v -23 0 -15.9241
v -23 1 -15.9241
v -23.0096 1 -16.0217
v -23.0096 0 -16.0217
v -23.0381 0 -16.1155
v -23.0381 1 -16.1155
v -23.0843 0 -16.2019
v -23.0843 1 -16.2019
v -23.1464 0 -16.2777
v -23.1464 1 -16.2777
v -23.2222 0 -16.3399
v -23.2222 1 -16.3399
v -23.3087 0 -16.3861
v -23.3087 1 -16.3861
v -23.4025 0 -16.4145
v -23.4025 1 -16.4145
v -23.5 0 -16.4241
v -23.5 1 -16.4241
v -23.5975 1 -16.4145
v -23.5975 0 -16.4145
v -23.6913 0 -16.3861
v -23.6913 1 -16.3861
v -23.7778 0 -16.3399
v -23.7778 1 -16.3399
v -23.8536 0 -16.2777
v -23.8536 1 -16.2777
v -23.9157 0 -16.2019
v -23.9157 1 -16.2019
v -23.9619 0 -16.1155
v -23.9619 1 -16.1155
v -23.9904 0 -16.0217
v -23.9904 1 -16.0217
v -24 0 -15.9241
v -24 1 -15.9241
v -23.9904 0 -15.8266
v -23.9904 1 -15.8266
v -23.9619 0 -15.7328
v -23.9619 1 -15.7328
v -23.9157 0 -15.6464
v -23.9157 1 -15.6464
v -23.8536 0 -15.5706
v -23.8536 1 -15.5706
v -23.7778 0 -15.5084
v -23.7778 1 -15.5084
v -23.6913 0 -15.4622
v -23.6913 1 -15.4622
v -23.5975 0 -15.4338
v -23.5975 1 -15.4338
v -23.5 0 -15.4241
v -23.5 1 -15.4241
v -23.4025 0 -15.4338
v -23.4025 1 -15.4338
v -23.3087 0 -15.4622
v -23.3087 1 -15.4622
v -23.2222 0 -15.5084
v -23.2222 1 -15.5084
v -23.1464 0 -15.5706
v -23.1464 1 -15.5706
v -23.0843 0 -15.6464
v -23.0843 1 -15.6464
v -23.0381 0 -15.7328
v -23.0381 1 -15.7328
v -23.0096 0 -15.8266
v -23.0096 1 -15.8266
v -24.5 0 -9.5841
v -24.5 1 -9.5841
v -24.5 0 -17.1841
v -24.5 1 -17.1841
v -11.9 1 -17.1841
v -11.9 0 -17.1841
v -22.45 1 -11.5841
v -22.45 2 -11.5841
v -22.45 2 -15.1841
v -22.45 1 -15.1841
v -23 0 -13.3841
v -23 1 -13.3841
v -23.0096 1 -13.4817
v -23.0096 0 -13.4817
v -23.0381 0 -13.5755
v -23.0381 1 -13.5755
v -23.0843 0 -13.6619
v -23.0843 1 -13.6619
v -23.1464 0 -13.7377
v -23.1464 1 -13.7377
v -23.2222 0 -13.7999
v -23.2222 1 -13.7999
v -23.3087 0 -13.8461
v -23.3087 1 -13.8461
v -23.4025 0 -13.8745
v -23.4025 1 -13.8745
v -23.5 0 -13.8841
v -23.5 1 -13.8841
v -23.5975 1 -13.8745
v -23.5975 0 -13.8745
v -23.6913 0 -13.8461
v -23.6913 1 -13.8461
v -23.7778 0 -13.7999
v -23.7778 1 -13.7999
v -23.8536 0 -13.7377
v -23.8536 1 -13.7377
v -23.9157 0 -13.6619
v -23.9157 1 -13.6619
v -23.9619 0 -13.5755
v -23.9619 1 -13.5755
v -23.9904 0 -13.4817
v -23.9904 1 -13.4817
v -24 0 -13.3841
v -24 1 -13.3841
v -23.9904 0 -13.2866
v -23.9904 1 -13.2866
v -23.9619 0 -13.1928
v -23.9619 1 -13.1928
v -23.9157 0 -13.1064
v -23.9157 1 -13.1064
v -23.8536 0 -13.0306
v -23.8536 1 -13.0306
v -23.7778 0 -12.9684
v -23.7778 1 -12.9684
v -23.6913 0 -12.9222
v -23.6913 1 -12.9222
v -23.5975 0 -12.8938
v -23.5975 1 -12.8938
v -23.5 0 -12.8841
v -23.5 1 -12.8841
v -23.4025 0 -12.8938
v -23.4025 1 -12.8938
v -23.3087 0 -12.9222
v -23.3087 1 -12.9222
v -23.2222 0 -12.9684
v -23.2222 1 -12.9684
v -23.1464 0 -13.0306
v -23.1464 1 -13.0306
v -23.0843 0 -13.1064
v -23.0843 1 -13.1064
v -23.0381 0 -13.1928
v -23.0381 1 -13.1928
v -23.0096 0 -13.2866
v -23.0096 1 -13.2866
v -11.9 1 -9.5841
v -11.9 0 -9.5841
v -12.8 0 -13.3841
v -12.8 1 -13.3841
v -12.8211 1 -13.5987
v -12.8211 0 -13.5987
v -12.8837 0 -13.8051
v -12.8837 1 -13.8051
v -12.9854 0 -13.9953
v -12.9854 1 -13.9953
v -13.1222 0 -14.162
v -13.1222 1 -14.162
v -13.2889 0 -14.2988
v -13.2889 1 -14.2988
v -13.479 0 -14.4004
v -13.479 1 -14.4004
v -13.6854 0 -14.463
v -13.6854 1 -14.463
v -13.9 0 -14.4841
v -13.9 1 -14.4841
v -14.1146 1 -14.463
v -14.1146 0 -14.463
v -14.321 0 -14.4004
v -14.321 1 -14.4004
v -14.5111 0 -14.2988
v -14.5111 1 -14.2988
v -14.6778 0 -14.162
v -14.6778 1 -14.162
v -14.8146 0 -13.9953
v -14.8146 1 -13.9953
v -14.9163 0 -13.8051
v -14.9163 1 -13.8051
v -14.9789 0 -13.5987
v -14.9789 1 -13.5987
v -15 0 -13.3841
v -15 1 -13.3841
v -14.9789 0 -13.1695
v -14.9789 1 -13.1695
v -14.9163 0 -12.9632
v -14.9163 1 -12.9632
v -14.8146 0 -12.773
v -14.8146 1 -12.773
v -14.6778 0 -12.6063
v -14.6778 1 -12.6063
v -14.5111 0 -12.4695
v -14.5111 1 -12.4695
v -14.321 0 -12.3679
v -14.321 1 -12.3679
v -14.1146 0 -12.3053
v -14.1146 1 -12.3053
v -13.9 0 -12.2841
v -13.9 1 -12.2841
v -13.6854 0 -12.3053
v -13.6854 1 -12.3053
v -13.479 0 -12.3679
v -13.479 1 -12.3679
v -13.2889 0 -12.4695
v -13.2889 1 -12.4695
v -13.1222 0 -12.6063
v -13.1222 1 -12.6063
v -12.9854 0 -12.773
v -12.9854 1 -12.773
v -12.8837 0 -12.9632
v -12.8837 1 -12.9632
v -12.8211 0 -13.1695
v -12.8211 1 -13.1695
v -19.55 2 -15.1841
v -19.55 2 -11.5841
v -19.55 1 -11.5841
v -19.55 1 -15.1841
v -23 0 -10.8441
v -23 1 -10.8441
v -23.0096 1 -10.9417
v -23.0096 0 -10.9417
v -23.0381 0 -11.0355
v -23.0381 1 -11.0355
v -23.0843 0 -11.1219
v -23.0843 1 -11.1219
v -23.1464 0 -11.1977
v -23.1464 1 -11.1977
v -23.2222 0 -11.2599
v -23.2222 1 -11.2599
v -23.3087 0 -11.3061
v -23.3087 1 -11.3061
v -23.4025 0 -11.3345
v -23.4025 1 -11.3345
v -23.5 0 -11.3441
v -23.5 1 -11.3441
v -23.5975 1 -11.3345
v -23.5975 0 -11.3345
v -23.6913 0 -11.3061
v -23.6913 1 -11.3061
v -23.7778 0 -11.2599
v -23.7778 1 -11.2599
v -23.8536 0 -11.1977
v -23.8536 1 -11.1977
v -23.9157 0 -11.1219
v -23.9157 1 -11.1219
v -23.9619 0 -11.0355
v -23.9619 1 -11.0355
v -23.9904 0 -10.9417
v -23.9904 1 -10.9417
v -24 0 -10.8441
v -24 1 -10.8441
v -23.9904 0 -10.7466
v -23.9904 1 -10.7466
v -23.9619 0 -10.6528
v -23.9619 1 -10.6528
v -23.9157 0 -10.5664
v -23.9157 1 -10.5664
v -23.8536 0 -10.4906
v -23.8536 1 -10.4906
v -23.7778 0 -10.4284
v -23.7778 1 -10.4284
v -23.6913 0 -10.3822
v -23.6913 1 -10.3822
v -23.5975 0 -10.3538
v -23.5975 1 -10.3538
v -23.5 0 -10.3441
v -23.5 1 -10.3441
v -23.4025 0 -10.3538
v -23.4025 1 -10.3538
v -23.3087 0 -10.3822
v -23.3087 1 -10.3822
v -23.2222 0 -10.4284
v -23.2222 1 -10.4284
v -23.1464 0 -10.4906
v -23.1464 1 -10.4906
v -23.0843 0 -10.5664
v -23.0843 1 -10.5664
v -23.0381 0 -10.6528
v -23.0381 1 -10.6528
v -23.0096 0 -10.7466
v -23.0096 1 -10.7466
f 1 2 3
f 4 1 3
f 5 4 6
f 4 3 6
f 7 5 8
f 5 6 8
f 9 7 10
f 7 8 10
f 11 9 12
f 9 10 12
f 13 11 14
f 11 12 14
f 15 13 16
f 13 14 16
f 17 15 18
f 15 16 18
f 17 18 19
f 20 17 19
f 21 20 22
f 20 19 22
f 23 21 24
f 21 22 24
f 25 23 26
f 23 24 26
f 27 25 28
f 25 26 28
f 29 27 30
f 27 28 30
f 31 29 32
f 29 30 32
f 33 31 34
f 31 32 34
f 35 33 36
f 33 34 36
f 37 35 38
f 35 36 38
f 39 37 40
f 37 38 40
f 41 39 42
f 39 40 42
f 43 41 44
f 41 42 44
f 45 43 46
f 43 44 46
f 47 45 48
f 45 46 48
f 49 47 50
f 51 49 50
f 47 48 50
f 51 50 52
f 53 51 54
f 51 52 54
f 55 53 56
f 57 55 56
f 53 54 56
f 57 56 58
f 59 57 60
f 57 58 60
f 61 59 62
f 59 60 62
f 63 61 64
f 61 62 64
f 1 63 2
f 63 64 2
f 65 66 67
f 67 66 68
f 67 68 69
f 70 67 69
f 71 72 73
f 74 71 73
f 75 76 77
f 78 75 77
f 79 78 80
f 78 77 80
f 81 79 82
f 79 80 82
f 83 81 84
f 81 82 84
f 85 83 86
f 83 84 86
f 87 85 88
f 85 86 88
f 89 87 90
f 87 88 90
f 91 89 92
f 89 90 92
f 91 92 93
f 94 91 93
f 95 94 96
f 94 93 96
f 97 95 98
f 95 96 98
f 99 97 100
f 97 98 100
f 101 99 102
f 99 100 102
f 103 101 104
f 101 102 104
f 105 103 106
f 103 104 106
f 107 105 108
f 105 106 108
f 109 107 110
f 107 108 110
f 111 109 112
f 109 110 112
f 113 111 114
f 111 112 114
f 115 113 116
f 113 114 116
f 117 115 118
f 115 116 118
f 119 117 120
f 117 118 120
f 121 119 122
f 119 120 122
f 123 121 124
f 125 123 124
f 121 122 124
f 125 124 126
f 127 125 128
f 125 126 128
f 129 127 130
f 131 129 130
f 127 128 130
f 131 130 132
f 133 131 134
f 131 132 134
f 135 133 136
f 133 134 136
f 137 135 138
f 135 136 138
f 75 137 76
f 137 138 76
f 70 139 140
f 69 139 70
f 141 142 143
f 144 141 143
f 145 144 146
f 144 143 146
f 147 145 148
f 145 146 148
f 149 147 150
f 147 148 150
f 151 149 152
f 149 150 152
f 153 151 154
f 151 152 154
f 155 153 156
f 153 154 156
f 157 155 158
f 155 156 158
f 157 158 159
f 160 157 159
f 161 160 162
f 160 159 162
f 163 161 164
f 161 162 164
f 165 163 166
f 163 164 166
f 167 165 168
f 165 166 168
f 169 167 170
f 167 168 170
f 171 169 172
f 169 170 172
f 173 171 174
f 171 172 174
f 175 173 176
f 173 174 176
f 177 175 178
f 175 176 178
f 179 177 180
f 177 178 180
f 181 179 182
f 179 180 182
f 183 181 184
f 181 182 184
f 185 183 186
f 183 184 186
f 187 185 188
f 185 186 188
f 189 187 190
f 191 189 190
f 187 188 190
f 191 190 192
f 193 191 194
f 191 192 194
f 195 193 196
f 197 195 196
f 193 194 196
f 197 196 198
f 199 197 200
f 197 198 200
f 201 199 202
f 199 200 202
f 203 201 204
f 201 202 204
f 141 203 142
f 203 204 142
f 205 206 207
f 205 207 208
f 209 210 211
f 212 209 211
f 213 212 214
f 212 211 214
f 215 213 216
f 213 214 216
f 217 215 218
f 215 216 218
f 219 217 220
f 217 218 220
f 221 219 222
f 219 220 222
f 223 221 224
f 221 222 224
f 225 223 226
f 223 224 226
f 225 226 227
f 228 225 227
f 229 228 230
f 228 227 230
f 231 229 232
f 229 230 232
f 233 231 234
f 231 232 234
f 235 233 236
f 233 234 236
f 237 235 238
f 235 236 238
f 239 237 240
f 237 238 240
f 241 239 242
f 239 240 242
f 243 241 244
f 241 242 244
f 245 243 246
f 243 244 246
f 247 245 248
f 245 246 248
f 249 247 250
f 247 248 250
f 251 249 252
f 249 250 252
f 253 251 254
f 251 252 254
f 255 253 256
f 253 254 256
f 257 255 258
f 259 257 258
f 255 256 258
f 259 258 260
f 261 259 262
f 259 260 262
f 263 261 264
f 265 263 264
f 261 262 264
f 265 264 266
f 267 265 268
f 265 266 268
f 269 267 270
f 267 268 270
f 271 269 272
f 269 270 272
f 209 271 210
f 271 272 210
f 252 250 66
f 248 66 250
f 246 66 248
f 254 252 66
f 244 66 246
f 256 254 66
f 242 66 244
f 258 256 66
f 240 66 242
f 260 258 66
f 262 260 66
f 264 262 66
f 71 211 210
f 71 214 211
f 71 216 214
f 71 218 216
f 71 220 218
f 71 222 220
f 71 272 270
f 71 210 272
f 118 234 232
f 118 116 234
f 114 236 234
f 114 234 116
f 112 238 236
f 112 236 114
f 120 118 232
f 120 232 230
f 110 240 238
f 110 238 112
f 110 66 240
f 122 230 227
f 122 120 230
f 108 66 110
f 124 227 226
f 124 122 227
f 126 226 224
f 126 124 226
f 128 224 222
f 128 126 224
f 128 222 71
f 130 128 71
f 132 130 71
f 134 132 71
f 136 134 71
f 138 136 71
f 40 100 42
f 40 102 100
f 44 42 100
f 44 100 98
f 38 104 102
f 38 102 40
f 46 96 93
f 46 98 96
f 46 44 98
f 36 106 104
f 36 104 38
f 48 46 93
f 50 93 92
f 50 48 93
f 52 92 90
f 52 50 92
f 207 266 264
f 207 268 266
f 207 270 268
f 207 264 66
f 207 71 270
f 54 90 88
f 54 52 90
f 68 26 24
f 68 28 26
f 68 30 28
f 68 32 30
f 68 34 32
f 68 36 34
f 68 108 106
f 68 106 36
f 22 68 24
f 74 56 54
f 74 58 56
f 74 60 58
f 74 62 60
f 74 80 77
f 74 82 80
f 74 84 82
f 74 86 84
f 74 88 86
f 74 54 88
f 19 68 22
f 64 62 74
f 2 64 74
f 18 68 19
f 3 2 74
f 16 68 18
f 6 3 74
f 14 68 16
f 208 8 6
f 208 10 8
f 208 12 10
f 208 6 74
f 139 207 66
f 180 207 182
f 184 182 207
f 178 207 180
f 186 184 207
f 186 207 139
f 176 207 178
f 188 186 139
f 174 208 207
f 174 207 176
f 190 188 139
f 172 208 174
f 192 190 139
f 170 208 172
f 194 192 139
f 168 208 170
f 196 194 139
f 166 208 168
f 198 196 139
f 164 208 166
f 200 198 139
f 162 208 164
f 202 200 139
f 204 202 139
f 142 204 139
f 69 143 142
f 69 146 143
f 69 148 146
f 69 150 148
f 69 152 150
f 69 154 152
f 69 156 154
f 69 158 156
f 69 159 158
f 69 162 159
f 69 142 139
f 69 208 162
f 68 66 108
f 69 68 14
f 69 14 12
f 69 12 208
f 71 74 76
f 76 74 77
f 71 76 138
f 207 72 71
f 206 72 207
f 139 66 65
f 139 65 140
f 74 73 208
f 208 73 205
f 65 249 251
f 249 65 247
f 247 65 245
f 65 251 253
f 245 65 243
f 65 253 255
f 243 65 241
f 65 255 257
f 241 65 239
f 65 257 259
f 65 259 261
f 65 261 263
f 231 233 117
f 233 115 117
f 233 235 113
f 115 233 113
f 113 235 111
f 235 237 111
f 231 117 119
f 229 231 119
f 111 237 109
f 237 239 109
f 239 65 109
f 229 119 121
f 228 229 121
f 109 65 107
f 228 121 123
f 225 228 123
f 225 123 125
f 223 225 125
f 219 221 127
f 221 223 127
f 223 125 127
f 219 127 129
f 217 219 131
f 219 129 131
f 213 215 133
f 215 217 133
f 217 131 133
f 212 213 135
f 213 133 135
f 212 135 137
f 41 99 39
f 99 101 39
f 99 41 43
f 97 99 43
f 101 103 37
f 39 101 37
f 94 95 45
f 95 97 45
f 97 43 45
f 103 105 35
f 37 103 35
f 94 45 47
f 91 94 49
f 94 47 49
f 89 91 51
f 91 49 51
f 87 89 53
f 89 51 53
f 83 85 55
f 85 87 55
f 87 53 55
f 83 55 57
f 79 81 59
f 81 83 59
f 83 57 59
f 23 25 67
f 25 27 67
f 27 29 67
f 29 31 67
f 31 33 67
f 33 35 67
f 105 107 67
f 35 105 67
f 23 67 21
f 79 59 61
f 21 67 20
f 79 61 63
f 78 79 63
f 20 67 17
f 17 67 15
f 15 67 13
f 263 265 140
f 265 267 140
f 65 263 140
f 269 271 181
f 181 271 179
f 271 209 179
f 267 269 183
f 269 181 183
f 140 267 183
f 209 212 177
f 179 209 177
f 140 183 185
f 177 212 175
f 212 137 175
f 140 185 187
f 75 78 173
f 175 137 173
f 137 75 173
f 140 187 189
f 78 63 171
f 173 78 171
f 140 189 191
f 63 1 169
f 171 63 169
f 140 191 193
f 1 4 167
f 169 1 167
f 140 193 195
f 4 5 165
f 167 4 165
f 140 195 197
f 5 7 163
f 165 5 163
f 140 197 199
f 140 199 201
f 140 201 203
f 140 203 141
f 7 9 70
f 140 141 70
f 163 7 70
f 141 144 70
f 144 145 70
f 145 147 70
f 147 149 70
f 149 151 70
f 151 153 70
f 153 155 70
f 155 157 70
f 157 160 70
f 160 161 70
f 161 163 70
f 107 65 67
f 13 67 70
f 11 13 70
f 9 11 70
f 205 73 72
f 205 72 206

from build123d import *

# Parameters (mm, degrees)
SKETCH1_W           = 17
SKETCH1_H           = 10
BOSS_EXTRUDE1_DEPTH = 1
SKETCH2_W           = 3
SKETCH2_H           = 4
BOSS_EXTRUDE2_DEPTH = 1
SKETCH3_W           = 22.308498818
SKETCH3_H           = 11.48116176
SKETCH3_W_2         = 12.6
SKETCH3_H_2         = 7.6
CUT_EXTRUDE1_DEPTH  = 1
SKETCH4_R           = 0.5
SKETCH4_R_2         = 1.1
CUT_EXTRUDE2_DEPTH  = 1
SKETCH5_W           = 3.647171716
SKETCH5_H           = 4.834622973
SKETCH5_W_2         = 2.9
SKETCH5_H_2         = 3.6
CUT_EXTRUDE3_DEPTH  = 1


with BuildPart() as part:
    # Sketch1 → Boss-Extrude1 (new body)
    with BuildSketch(Plane(origin=(0, 0, 0), x_dir=(1, 0, 0), z_dir=(0, 1, 0))):
        with Locations((-16, 13.384146341)):
            Rectangle(SKETCH1_W, SKETCH1_H)
    extrude(amount=BOSS_EXTRUDE1_DEPTH)

    # Sketch2 → Boss-Extrude2 (add)
    with BuildSketch(Plane(origin=(0, 1, 0), x_dir=(1, 0, 0), z_dir=(0, 1, 0))):
        with Locations((-21, 13.384146341)):
            Rectangle(SKETCH2_W, SKETCH2_H)
    extrude(amount=BOSS_EXTRUDE2_DEPTH)

    # Sketch3 → Cut-Extrude1 (cut)
    with BuildSketch(Plane(origin=(0, 1, 0), x_dir=(1, 0, 0), z_dir=(0, 1, 0))):
        with Locations((-18.026856575, 13.593370246)):
            Rectangle(SKETCH3_W, SKETCH3_H)
        with Locations((-18.2, 13.384146341)):
            Rectangle(SKETCH3_W_2, SKETCH3_H_2, mode=Mode.SUBTRACT)
    extrude(amount=-CUT_EXTRUDE1_DEPTH, mode=Mode.SUBTRACT)

    # Sketch4 → Cut-Extrude2 (cut)
    with BuildSketch(Plane(origin=(0, 1, 0), x_dir=(1, 0, 0), z_dir=(0, 1, 0))):
        with Locations((-23.5, 13.384146341)):
            Circle(SKETCH4_R)
        with Locations((-23.5, 15.924146341)):
            Circle(SKETCH4_R)
        with Locations((-23.5, 10.844146341)):
            Circle(SKETCH4_R)
        with Locations((-13.9, 13.384146341)):
            Circle(SKETCH4_R_2)
    extrude(amount=-CUT_EXTRUDE2_DEPTH, mode=Mode.SUBTRACT)

    # Sketch5 → Cut-Extrude3 (cut)
    with BuildSketch(Plane(origin=(0, 2, 0), x_dir=(1, 0, 0), z_dir=(0, 1, 0))):
        with Locations((-20.925831492, 13.474507318)):
            Rectangle(SKETCH5_W, SKETCH5_H)
        with Locations((-21, 13.384146341)):
            Rectangle(SKETCH5_W_2, SKETCH5_H_2, mode=Mode.SUBTRACT)
    extrude(amount=-CUT_EXTRUDE3_DEPTH, mode=Mode.SUBTRACT)


solid = part.part
